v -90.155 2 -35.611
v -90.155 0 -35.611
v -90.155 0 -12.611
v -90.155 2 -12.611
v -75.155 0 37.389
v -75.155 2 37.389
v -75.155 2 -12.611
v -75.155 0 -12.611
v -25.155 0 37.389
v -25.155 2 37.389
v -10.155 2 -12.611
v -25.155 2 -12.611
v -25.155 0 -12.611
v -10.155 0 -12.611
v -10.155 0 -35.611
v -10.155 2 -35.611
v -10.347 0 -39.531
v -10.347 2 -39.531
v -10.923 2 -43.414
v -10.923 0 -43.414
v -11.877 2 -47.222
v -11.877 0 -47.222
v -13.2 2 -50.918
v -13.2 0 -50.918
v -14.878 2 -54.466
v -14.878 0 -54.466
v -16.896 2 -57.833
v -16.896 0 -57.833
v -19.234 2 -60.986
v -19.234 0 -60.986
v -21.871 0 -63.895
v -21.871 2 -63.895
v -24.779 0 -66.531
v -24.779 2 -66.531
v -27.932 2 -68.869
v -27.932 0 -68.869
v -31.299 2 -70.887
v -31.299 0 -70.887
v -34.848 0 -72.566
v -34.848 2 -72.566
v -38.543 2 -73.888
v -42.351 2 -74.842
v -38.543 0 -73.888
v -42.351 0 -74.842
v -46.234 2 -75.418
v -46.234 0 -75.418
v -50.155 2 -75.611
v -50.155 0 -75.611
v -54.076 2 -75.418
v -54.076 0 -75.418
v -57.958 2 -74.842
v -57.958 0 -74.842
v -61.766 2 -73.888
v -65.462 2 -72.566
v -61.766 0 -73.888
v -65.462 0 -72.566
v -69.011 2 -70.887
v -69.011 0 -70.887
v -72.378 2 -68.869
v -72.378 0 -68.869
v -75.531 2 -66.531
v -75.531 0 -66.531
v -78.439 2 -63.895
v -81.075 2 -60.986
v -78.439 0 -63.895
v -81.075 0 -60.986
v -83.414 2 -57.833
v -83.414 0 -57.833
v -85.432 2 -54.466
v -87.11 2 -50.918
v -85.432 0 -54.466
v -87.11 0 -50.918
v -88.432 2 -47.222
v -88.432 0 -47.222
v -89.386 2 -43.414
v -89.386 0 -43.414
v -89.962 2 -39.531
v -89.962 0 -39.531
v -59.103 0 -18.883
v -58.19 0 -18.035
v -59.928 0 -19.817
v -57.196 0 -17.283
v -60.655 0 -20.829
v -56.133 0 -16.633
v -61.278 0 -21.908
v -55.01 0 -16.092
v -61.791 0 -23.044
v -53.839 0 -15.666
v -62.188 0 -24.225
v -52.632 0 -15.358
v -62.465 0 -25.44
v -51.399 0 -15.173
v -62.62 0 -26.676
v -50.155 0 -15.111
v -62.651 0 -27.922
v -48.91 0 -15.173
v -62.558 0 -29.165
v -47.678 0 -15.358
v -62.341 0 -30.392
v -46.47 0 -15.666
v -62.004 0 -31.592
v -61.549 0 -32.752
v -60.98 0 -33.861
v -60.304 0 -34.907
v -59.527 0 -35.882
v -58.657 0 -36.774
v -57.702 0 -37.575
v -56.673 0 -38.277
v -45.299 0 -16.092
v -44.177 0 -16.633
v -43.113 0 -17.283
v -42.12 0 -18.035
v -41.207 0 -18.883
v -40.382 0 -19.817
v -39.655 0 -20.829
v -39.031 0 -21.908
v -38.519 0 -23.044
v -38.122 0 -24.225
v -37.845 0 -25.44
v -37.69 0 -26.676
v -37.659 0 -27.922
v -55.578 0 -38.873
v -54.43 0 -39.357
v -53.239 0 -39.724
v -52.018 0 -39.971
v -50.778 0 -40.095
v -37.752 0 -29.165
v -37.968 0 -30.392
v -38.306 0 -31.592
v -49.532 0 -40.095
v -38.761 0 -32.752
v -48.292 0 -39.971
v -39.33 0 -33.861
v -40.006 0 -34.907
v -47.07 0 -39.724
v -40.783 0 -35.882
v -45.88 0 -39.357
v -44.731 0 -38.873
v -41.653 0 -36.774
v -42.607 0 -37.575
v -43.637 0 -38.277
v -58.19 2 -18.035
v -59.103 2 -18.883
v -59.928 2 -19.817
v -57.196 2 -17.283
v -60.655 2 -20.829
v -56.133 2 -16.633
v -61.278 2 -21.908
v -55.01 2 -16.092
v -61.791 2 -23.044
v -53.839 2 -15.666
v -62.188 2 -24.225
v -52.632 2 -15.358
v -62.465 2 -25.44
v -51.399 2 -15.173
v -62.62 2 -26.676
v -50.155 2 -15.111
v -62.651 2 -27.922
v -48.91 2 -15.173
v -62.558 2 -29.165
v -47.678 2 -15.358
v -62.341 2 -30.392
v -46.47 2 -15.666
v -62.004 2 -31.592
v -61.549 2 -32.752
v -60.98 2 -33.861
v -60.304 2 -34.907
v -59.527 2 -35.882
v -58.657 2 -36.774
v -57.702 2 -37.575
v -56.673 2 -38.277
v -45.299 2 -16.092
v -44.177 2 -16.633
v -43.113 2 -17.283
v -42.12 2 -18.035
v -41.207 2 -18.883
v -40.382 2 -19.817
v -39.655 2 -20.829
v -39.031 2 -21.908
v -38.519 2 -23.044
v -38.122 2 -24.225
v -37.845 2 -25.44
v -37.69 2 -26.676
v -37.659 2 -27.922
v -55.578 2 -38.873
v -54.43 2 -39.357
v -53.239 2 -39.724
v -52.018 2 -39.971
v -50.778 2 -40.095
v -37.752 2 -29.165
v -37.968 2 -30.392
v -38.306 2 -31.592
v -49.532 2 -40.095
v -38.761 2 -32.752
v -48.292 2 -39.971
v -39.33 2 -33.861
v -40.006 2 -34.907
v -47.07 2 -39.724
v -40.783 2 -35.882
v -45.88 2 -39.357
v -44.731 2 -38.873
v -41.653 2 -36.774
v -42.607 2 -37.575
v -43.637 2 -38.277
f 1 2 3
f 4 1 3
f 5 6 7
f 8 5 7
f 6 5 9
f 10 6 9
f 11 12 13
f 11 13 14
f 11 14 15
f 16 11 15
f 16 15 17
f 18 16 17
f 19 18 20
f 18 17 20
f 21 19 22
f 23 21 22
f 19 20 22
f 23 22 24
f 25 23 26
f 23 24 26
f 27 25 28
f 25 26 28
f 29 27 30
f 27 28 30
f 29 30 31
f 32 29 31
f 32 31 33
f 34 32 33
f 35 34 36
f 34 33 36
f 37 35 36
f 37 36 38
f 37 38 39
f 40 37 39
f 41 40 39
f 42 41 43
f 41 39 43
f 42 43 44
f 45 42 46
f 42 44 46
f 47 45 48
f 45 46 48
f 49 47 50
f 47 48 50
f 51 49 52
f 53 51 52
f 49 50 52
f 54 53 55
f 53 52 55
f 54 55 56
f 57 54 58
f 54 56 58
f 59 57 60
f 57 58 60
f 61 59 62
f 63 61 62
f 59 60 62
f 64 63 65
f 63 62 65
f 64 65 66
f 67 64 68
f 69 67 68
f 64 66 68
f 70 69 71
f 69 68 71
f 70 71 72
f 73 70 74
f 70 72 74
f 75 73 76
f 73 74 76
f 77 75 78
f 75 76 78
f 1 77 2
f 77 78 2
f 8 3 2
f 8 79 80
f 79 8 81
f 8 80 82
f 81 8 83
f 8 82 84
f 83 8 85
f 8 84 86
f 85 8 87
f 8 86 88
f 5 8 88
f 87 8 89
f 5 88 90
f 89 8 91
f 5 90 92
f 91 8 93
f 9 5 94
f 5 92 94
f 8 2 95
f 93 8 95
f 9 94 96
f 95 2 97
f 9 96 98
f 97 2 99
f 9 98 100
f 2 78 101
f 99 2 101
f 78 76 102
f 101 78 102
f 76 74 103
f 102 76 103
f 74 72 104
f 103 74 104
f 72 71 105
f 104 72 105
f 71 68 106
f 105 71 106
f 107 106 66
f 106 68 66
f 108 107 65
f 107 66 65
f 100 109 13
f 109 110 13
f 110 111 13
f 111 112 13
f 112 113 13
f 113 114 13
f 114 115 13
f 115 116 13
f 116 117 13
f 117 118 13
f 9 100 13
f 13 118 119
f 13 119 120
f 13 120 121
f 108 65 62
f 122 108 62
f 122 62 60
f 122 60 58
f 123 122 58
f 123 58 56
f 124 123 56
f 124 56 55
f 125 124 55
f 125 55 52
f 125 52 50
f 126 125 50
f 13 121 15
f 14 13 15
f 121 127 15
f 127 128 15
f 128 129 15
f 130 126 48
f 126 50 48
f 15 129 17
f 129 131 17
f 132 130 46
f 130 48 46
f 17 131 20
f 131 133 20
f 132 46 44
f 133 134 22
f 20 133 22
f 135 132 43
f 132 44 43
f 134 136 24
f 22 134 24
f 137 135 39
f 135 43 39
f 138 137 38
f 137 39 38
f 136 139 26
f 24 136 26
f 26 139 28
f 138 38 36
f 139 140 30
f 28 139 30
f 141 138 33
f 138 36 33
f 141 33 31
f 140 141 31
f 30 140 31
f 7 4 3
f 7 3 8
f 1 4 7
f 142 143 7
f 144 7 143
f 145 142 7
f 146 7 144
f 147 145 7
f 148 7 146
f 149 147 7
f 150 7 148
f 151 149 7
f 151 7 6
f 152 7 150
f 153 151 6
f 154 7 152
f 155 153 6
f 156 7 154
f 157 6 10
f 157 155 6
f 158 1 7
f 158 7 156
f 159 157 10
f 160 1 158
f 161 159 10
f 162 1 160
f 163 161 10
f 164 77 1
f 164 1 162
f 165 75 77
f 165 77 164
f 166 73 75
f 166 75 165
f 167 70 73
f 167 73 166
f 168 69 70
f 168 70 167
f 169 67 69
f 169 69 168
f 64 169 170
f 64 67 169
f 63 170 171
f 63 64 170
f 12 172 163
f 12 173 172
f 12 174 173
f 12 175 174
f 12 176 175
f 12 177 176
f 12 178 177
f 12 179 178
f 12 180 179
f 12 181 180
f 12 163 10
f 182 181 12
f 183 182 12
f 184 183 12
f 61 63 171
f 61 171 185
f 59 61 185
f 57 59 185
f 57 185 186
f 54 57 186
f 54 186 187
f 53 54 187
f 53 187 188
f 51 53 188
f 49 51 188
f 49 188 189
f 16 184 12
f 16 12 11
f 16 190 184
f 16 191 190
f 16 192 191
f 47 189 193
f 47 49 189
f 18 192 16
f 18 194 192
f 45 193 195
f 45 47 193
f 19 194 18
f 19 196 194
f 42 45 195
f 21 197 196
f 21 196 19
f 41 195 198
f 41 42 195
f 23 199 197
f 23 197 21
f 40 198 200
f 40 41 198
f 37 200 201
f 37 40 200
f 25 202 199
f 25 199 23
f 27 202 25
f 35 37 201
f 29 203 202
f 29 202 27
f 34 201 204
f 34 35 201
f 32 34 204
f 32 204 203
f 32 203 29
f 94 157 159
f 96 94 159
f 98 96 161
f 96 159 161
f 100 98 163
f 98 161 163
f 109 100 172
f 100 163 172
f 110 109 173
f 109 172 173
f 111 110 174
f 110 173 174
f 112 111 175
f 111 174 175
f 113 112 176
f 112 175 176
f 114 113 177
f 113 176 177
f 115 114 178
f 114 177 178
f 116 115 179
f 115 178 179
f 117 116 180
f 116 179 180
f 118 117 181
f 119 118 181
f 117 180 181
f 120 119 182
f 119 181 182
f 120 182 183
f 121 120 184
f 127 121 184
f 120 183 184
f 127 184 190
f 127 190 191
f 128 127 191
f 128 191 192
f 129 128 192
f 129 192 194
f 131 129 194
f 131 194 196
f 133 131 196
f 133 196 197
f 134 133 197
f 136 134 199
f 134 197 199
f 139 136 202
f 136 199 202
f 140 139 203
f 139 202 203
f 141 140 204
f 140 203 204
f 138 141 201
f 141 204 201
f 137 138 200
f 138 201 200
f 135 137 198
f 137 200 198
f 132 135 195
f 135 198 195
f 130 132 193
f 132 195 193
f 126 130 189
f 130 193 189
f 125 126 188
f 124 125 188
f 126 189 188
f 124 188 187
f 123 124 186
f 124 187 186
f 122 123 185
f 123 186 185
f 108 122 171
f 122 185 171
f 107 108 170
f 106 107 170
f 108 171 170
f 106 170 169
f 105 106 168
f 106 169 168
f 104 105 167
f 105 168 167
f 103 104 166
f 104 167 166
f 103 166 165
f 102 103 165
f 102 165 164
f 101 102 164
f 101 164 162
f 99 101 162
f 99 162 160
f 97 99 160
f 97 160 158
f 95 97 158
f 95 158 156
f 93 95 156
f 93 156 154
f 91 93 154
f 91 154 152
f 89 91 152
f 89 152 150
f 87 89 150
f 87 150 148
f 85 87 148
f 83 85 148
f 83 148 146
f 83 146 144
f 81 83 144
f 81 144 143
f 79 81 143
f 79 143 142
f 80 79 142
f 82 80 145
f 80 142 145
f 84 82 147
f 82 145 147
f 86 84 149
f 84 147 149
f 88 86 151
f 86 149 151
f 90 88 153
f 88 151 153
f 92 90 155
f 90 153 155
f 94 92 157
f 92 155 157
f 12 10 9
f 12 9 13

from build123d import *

# Parameters (mm, degrees)
BOSS_EXTRUDE1_DEPTH = 2
SKETCH2_R           = 12.5
SKETCH2_W           = 15
SKETCH2_H           = 50
CUT_EXTRUDE1_DEPTH  = 2


with BuildPart() as part:
    # Sketch1 → Boss-Extrude1 (new body)
    with BuildSketch(Plane(origin=(0, 0, 0), x_dir=(1, 0, 0), z_dir=(0, 1, 0))):
        with BuildLine():
            Line((-90.154867257, 35.610619469), (-90.154867257, -37.389380531))
            Line((-90.154867257, -37.389380531), (-10.154867257, -37.389380531))
            Line((-10.154867257, -37.389380531), (-10.154867257, 35.610619469))
            ThreePointArc((-10.154867257, 35.610619469), (-50.154867257, 75.610619469), (-90.154867257, 35.610619469))
        make_face()
    extrude(amount=BOSS_EXTRUDE1_DEPTH)

    # Sketch2 → Cut-Extrude1 (cut)
    with BuildSketch(Plane(origin=(0, 2, 0), x_dir=(1, 0, 0), z_dir=(0, 1, 0))):
        with Locations(Location((-50.154867257, 27.610619469, 0), (0, 0, 270))):
            Circle(SKETCH2_R)
        with Locations((-82.654867257, -12.389380531)):
            Rectangle(SKETCH2_W, SKETCH2_H)
        with Locations((-17.654867257, -12.389380531)):
            Rectangle(SKETCH2_W, SKETCH2_H)
    extrude(amount=-CUT_EXTRUDE1_DEPTH, mode=Mode.SUBTRACT)


solid = part.part
